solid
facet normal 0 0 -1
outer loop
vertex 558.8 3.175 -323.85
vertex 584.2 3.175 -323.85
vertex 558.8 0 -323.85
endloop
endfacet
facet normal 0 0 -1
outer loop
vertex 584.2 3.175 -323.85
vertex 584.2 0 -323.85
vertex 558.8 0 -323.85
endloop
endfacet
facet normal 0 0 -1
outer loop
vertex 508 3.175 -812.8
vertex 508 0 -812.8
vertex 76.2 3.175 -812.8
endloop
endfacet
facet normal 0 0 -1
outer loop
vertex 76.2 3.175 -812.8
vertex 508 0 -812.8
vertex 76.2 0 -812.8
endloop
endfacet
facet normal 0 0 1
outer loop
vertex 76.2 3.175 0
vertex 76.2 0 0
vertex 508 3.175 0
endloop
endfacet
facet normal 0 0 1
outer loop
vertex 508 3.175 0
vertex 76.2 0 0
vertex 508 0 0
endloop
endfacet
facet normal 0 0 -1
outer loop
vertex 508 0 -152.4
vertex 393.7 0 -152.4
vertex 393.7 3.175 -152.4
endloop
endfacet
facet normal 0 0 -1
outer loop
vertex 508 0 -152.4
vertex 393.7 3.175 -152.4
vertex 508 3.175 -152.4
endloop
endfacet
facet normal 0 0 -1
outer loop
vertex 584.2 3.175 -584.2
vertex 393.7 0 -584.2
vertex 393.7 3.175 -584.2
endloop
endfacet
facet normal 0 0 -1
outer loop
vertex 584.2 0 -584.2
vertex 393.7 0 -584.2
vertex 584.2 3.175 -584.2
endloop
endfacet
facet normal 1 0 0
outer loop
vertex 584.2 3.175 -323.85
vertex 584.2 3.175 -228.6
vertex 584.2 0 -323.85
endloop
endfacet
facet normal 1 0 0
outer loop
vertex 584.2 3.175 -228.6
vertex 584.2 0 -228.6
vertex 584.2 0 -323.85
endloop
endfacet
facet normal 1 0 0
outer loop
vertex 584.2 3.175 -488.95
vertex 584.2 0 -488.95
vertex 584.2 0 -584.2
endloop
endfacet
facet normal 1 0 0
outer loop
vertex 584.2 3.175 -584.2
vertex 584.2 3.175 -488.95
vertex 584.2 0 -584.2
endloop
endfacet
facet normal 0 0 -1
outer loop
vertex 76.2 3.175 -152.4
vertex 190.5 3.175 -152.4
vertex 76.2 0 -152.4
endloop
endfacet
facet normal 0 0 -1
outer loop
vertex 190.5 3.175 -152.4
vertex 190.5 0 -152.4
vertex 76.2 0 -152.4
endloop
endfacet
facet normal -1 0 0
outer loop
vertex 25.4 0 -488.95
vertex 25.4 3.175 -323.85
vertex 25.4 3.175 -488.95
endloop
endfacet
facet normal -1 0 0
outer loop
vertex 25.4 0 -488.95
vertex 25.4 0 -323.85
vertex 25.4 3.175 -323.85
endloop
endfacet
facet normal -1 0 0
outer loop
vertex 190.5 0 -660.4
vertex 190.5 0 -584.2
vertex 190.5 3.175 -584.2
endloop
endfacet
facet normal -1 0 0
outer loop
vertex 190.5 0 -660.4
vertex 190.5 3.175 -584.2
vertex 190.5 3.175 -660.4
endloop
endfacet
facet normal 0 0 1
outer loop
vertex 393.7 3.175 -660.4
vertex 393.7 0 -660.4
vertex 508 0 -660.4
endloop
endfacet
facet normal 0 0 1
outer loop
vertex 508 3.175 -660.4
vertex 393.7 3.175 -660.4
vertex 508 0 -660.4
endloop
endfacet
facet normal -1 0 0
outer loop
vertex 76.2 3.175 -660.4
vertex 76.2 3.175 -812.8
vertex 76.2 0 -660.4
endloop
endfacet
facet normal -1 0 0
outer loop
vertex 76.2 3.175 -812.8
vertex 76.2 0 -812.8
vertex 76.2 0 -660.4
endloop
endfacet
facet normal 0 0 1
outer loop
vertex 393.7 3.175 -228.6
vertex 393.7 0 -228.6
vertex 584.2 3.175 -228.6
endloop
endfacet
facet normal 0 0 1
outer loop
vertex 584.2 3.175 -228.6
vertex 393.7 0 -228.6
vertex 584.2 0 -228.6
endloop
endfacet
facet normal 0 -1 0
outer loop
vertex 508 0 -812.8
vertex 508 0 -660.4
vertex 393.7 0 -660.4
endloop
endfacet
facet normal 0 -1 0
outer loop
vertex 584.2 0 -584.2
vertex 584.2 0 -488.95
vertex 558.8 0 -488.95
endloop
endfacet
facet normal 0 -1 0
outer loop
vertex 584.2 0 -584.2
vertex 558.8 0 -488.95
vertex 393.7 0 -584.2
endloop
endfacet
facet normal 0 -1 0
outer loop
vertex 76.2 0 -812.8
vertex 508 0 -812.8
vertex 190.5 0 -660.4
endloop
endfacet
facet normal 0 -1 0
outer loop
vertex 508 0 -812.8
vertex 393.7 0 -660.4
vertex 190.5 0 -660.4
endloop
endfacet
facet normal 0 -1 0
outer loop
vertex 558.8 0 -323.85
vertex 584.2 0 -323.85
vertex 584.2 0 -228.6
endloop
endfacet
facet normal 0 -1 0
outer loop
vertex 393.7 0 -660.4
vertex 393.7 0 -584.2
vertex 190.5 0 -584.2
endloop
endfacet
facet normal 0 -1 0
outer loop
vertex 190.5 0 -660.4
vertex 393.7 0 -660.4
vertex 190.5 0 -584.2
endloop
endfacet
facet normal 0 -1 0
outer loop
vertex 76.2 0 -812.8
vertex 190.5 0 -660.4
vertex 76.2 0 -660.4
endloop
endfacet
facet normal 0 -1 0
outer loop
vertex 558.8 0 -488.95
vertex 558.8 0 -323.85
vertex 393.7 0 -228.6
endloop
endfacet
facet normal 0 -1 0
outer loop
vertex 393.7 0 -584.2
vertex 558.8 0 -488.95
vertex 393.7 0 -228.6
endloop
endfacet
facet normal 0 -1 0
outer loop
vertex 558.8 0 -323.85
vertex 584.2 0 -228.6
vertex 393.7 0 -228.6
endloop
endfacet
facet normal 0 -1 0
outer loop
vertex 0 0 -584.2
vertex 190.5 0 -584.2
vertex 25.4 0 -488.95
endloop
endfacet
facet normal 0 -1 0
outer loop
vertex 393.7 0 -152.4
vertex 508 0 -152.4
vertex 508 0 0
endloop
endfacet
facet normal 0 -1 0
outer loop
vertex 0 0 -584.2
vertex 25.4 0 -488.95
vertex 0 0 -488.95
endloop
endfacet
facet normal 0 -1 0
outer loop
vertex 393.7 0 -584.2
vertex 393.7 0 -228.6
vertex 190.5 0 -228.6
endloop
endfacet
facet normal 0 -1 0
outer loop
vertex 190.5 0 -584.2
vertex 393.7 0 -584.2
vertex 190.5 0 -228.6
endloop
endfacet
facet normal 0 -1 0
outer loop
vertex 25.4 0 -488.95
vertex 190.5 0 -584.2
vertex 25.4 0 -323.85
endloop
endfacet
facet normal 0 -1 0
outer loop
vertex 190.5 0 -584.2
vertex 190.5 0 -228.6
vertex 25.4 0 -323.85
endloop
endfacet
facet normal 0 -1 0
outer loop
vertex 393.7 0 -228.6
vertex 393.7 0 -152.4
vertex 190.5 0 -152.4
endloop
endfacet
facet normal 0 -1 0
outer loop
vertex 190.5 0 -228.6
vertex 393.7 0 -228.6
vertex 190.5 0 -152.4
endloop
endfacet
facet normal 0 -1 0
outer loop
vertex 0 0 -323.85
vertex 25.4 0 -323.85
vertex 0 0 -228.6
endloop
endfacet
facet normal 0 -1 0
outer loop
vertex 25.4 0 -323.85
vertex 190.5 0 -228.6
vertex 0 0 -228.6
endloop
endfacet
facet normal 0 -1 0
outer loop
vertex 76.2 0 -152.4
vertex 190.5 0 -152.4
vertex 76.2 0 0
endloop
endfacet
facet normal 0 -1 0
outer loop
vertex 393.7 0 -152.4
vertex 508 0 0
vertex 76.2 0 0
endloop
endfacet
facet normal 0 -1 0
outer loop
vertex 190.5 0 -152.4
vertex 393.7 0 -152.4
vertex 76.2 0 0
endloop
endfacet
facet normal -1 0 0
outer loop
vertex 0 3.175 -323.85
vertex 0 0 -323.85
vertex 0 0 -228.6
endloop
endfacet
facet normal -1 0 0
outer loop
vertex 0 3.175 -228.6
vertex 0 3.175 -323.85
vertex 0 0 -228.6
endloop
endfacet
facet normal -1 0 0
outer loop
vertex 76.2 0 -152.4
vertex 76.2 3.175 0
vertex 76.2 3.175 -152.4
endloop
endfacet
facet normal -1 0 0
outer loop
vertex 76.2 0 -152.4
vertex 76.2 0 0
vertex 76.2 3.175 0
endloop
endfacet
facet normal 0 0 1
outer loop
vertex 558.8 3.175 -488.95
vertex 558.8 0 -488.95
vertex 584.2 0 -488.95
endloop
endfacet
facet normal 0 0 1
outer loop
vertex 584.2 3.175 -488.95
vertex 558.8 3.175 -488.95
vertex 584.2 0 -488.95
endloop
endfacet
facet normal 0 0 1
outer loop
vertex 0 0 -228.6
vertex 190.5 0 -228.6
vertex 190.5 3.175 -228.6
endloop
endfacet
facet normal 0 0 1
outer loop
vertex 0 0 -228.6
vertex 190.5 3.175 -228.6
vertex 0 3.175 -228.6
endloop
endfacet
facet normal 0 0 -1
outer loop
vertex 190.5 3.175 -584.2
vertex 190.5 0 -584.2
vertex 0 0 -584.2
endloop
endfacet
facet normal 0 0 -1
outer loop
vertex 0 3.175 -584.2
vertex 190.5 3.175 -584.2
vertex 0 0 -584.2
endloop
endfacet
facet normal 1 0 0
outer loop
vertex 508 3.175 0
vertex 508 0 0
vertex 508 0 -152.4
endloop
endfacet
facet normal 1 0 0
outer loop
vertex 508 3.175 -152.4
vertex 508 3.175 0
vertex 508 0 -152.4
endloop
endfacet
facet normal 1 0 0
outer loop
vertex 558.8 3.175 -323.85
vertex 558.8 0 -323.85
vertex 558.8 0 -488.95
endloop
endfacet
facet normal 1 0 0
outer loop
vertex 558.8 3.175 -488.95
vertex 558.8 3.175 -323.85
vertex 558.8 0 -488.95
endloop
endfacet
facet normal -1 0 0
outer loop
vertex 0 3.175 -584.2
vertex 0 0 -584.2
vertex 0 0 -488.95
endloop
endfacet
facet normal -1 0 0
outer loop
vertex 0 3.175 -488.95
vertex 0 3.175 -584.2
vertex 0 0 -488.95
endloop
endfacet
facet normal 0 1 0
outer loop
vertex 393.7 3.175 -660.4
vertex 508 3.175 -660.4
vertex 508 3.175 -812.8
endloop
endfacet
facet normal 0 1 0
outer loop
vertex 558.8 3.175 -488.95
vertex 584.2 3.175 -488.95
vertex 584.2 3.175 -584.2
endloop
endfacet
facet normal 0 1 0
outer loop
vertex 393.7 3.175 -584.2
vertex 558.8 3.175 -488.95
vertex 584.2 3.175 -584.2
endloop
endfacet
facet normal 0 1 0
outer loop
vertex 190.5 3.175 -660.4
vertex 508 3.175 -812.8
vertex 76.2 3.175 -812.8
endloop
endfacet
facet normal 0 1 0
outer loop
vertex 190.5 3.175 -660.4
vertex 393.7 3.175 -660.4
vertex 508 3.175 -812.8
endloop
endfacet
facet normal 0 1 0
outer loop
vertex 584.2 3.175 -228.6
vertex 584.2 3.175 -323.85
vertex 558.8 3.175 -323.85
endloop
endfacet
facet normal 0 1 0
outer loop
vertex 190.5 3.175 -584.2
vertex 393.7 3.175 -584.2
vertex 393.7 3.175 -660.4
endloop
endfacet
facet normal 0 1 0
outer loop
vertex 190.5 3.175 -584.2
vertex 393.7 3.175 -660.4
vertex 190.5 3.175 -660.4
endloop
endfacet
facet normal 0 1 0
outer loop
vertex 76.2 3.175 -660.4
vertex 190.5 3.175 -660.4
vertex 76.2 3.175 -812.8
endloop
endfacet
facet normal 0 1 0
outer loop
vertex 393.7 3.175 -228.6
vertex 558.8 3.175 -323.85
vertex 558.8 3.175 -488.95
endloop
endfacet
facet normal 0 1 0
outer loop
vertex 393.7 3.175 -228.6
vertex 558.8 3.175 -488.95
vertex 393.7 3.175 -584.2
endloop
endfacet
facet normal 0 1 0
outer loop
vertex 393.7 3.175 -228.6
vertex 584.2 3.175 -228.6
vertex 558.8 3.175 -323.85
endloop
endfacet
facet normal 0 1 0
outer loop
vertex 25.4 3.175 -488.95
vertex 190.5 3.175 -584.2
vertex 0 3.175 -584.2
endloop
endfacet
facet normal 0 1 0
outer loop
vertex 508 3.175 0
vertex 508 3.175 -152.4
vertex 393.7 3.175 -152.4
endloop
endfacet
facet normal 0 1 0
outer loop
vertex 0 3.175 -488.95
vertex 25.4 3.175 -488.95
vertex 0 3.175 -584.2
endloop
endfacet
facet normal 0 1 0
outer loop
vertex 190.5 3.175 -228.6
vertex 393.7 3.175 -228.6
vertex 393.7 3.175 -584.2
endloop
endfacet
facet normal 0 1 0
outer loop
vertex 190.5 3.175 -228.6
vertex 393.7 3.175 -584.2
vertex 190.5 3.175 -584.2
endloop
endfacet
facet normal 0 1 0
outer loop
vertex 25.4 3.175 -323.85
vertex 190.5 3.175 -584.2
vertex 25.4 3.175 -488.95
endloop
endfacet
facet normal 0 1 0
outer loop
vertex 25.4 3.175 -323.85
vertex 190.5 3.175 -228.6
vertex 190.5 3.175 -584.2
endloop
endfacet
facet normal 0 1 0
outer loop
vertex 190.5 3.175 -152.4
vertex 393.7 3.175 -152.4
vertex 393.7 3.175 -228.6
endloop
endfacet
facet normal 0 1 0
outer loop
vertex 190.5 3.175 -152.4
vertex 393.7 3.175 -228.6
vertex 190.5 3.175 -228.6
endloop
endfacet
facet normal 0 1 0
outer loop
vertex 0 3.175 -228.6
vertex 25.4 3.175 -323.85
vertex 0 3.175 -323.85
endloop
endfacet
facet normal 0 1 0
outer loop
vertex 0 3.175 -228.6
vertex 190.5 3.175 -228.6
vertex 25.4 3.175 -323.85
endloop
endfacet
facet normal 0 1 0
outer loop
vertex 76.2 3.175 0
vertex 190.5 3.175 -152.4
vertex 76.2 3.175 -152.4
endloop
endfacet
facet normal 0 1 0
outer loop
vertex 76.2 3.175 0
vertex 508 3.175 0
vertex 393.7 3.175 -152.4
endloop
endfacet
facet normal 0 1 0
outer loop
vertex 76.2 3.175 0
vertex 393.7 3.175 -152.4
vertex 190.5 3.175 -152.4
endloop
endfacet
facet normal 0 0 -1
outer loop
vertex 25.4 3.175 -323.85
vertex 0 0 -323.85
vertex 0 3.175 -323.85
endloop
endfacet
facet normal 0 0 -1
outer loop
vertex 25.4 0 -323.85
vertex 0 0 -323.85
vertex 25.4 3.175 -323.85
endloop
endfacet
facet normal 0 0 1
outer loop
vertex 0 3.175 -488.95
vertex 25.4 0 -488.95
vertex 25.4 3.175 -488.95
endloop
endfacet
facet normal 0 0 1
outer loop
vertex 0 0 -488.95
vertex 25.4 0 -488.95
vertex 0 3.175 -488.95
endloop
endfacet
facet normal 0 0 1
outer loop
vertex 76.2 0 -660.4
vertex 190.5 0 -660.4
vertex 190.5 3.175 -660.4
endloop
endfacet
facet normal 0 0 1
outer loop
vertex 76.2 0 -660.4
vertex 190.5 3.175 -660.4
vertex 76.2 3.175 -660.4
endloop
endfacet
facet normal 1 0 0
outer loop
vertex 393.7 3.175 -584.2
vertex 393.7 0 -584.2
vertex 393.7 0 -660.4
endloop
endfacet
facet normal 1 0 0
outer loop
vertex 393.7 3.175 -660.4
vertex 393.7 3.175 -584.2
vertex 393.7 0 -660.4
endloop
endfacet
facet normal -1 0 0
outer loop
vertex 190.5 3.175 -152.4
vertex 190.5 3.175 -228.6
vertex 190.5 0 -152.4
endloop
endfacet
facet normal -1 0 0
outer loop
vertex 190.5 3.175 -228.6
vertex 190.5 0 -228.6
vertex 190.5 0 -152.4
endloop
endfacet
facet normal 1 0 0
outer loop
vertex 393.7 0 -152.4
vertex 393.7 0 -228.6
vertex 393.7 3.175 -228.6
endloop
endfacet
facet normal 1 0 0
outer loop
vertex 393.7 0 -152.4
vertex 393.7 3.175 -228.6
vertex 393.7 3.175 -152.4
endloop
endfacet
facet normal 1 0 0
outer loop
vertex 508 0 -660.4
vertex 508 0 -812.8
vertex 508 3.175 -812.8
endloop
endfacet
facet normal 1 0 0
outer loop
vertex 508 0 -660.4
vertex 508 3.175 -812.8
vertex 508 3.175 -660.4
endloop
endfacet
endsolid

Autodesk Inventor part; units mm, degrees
ref_plane "YZ Plane" through (0, 0, 0) normal (1, 0, 0) x (0, 1, 0)
ref_plane "XZ Plane" through (0, 0, 0) normal (0, 1, 0) x (-1, 0, 0)
ref_plane "XY Plane" through (0, 0, 0) normal (0, 0, 1) x (1, 0, 0)
sketch "Sketch1" plane through (0, 0, 0) normal (0, 1, 0) x (-1, 0, 0)
  line L0 (0, 0) -> (-584.2, 0)
  line L1 (-584.2, 0) -> (-584.2, -812.8)
  line L2 (-584.2, -812.8) -> (0, -812.8)
  line L3 (0, -812.8) -> (0, 0)
  dimension "d0" = 584.2
  dimension "d1" = 812.8
extrude "Extrusion1" add sketch "Sketch1" along normal blind 3.175
sketch "Sketch2" plane through (0, 0, 0) normal (0, -1, 0) x (1, 0, 0)
  line L0 (0, 0) -> (584.2, 0) projected
  line L1 (0, -812.8) -> (0, 0) projected
  line L2 (584.2, -812.8) -> (0, -812.8) projected
  line L3 (584.2, 0) -> (584.2, -812.8) projected
  line L4 (584.2, 0) -> (584.2, -812.8) projected
  line L5 (584.2, -323.85) -> (558.8, -323.85)
  line L6 (558.8, -323.85) -> (558.8, -488.95)
  line L7 (558.8, -488.95) -> (584.2, -488.95)
  line L8 (584.2, -488.95) -> (584.2, -323.85)
  line L9 (0, -812.8) -> (0, 0) projected
  line L10 (0, -323.85) -> (25.4, -323.85)
  line L11 (25.4, -323.85) -> (25.4, -488.95)
  line L12 (25.4, -488.95) -> (0, -488.95)
  line L13 (0, -488.95) -> (0, -323.85)
  line L14 (584.2, 0) -> (508, 0)
  line L15 (508, 0) -> (508, -228.6)
  line L16 (508, -228.6) -> (584.2, -228.6)
  line L17 (584.2, -228.6) -> (584.2, 0)
  line L18 (0, 0) -> (76.2, 0)
  line L19 (76.2, 0) -> (76.2, -228.6)
  line L20 (76.2, -228.6) -> (0, -228.6)
  line L21 (0, -228.6) -> (0, 0)
  line L22 (0, -812.8) -> (76.2, -812.8)
  line L23 (76.2, -812.8) -> (76.2, -584.2)
  line L24 (76.2, -584.2) -> (0, -584.2)
  line L25 (0, -584.2) -> (0, -812.8)
  line L26 (584.2, -812.8) -> (508, -812.8)
  line L27 (508, -812.8) -> (508, -584.2)
  line L28 (508, -584.2) -> (584.2, -584.2)
  line L29 (584.2, -584.2) -> (584.2, -812.8)
  line L30 (508, -228.6) -> (393.7, -228.6)
  line L31 (393.7, -228.6) -> (393.7, -152.4)
  line L32 (393.7, -152.4) -> (508, -152.4)
  line L33 (508, -152.4) -> (508, -228.6)
  line L34 (508, -584.2) -> (393.7, -584.2)
  line L35 (393.7, -584.2) -> (393.7, -660.4)
  line L36 (393.7, -660.4) -> (508, -660.4)
  line L37 (508, -660.4) -> (508, -584.2)
  line L38 (76.2, -584.2) -> (190.5, -584.2)
  line L39 (190.5, -584.2) -> (190.5, -660.4)
  line L40 (190.5, -660.4) -> (76.2, -660.4)
  line L41 (76.2, -660.4) -> (76.2, -584.2)
  line L42 (76.2, -228.6) -> (190.5, -228.6)
  line L43 (190.5, -228.6) -> (190.5, -152.4)
  line L44 (190.5, -152.4) -> (76.2, -152.4)
  line L45 (76.2, -152.4) -> (76.2, -228.6)
  dimension "d4" = 165.1
  dimension "d5" = 165.1
  dimension "d6" = 25.4
  dimension "d7" = 25.4
  dimension "d8" = 323.85
  dimension "d9" = 323.85
  dimension "d10" = 76.2
  dimension "d11" = 228.6
  dimension "d12" = 76.2
  dimension "d13" = 228.6
  dimension "d14" = 76.2
  dimension "d15" = 228.6
  dimension "d16" = 76.2
  dimension "d17" = 228.6
  dimension "d18" = 114.3
  dimension "d19" = 76.2
  dimension "d20" = 114.3
  dimension "d21" = 76.2
  dimension "d22" = 114.3
  dimension "d23" = 76.2
  dimension "d24" = 114.3
  dimension "d25" = 76.2
extrude "Extrusion2" cut sketch "Sketch2" against normal blind 3.175 contours L0 L19 L20 L1 | L0 L3 L16 L15 | L44 L43 L42 L19 | L10 L11 L12 L1 | L15 L30 L31 L32 | L24 L23 L2 L1 | L3 L7 L6 L5 | L38 L39 L40 L23 | L3 L2 L27 L28 | L27 L36 L35 L34
properties part number "polycarb base" material "Polycarbonate, Clear"
